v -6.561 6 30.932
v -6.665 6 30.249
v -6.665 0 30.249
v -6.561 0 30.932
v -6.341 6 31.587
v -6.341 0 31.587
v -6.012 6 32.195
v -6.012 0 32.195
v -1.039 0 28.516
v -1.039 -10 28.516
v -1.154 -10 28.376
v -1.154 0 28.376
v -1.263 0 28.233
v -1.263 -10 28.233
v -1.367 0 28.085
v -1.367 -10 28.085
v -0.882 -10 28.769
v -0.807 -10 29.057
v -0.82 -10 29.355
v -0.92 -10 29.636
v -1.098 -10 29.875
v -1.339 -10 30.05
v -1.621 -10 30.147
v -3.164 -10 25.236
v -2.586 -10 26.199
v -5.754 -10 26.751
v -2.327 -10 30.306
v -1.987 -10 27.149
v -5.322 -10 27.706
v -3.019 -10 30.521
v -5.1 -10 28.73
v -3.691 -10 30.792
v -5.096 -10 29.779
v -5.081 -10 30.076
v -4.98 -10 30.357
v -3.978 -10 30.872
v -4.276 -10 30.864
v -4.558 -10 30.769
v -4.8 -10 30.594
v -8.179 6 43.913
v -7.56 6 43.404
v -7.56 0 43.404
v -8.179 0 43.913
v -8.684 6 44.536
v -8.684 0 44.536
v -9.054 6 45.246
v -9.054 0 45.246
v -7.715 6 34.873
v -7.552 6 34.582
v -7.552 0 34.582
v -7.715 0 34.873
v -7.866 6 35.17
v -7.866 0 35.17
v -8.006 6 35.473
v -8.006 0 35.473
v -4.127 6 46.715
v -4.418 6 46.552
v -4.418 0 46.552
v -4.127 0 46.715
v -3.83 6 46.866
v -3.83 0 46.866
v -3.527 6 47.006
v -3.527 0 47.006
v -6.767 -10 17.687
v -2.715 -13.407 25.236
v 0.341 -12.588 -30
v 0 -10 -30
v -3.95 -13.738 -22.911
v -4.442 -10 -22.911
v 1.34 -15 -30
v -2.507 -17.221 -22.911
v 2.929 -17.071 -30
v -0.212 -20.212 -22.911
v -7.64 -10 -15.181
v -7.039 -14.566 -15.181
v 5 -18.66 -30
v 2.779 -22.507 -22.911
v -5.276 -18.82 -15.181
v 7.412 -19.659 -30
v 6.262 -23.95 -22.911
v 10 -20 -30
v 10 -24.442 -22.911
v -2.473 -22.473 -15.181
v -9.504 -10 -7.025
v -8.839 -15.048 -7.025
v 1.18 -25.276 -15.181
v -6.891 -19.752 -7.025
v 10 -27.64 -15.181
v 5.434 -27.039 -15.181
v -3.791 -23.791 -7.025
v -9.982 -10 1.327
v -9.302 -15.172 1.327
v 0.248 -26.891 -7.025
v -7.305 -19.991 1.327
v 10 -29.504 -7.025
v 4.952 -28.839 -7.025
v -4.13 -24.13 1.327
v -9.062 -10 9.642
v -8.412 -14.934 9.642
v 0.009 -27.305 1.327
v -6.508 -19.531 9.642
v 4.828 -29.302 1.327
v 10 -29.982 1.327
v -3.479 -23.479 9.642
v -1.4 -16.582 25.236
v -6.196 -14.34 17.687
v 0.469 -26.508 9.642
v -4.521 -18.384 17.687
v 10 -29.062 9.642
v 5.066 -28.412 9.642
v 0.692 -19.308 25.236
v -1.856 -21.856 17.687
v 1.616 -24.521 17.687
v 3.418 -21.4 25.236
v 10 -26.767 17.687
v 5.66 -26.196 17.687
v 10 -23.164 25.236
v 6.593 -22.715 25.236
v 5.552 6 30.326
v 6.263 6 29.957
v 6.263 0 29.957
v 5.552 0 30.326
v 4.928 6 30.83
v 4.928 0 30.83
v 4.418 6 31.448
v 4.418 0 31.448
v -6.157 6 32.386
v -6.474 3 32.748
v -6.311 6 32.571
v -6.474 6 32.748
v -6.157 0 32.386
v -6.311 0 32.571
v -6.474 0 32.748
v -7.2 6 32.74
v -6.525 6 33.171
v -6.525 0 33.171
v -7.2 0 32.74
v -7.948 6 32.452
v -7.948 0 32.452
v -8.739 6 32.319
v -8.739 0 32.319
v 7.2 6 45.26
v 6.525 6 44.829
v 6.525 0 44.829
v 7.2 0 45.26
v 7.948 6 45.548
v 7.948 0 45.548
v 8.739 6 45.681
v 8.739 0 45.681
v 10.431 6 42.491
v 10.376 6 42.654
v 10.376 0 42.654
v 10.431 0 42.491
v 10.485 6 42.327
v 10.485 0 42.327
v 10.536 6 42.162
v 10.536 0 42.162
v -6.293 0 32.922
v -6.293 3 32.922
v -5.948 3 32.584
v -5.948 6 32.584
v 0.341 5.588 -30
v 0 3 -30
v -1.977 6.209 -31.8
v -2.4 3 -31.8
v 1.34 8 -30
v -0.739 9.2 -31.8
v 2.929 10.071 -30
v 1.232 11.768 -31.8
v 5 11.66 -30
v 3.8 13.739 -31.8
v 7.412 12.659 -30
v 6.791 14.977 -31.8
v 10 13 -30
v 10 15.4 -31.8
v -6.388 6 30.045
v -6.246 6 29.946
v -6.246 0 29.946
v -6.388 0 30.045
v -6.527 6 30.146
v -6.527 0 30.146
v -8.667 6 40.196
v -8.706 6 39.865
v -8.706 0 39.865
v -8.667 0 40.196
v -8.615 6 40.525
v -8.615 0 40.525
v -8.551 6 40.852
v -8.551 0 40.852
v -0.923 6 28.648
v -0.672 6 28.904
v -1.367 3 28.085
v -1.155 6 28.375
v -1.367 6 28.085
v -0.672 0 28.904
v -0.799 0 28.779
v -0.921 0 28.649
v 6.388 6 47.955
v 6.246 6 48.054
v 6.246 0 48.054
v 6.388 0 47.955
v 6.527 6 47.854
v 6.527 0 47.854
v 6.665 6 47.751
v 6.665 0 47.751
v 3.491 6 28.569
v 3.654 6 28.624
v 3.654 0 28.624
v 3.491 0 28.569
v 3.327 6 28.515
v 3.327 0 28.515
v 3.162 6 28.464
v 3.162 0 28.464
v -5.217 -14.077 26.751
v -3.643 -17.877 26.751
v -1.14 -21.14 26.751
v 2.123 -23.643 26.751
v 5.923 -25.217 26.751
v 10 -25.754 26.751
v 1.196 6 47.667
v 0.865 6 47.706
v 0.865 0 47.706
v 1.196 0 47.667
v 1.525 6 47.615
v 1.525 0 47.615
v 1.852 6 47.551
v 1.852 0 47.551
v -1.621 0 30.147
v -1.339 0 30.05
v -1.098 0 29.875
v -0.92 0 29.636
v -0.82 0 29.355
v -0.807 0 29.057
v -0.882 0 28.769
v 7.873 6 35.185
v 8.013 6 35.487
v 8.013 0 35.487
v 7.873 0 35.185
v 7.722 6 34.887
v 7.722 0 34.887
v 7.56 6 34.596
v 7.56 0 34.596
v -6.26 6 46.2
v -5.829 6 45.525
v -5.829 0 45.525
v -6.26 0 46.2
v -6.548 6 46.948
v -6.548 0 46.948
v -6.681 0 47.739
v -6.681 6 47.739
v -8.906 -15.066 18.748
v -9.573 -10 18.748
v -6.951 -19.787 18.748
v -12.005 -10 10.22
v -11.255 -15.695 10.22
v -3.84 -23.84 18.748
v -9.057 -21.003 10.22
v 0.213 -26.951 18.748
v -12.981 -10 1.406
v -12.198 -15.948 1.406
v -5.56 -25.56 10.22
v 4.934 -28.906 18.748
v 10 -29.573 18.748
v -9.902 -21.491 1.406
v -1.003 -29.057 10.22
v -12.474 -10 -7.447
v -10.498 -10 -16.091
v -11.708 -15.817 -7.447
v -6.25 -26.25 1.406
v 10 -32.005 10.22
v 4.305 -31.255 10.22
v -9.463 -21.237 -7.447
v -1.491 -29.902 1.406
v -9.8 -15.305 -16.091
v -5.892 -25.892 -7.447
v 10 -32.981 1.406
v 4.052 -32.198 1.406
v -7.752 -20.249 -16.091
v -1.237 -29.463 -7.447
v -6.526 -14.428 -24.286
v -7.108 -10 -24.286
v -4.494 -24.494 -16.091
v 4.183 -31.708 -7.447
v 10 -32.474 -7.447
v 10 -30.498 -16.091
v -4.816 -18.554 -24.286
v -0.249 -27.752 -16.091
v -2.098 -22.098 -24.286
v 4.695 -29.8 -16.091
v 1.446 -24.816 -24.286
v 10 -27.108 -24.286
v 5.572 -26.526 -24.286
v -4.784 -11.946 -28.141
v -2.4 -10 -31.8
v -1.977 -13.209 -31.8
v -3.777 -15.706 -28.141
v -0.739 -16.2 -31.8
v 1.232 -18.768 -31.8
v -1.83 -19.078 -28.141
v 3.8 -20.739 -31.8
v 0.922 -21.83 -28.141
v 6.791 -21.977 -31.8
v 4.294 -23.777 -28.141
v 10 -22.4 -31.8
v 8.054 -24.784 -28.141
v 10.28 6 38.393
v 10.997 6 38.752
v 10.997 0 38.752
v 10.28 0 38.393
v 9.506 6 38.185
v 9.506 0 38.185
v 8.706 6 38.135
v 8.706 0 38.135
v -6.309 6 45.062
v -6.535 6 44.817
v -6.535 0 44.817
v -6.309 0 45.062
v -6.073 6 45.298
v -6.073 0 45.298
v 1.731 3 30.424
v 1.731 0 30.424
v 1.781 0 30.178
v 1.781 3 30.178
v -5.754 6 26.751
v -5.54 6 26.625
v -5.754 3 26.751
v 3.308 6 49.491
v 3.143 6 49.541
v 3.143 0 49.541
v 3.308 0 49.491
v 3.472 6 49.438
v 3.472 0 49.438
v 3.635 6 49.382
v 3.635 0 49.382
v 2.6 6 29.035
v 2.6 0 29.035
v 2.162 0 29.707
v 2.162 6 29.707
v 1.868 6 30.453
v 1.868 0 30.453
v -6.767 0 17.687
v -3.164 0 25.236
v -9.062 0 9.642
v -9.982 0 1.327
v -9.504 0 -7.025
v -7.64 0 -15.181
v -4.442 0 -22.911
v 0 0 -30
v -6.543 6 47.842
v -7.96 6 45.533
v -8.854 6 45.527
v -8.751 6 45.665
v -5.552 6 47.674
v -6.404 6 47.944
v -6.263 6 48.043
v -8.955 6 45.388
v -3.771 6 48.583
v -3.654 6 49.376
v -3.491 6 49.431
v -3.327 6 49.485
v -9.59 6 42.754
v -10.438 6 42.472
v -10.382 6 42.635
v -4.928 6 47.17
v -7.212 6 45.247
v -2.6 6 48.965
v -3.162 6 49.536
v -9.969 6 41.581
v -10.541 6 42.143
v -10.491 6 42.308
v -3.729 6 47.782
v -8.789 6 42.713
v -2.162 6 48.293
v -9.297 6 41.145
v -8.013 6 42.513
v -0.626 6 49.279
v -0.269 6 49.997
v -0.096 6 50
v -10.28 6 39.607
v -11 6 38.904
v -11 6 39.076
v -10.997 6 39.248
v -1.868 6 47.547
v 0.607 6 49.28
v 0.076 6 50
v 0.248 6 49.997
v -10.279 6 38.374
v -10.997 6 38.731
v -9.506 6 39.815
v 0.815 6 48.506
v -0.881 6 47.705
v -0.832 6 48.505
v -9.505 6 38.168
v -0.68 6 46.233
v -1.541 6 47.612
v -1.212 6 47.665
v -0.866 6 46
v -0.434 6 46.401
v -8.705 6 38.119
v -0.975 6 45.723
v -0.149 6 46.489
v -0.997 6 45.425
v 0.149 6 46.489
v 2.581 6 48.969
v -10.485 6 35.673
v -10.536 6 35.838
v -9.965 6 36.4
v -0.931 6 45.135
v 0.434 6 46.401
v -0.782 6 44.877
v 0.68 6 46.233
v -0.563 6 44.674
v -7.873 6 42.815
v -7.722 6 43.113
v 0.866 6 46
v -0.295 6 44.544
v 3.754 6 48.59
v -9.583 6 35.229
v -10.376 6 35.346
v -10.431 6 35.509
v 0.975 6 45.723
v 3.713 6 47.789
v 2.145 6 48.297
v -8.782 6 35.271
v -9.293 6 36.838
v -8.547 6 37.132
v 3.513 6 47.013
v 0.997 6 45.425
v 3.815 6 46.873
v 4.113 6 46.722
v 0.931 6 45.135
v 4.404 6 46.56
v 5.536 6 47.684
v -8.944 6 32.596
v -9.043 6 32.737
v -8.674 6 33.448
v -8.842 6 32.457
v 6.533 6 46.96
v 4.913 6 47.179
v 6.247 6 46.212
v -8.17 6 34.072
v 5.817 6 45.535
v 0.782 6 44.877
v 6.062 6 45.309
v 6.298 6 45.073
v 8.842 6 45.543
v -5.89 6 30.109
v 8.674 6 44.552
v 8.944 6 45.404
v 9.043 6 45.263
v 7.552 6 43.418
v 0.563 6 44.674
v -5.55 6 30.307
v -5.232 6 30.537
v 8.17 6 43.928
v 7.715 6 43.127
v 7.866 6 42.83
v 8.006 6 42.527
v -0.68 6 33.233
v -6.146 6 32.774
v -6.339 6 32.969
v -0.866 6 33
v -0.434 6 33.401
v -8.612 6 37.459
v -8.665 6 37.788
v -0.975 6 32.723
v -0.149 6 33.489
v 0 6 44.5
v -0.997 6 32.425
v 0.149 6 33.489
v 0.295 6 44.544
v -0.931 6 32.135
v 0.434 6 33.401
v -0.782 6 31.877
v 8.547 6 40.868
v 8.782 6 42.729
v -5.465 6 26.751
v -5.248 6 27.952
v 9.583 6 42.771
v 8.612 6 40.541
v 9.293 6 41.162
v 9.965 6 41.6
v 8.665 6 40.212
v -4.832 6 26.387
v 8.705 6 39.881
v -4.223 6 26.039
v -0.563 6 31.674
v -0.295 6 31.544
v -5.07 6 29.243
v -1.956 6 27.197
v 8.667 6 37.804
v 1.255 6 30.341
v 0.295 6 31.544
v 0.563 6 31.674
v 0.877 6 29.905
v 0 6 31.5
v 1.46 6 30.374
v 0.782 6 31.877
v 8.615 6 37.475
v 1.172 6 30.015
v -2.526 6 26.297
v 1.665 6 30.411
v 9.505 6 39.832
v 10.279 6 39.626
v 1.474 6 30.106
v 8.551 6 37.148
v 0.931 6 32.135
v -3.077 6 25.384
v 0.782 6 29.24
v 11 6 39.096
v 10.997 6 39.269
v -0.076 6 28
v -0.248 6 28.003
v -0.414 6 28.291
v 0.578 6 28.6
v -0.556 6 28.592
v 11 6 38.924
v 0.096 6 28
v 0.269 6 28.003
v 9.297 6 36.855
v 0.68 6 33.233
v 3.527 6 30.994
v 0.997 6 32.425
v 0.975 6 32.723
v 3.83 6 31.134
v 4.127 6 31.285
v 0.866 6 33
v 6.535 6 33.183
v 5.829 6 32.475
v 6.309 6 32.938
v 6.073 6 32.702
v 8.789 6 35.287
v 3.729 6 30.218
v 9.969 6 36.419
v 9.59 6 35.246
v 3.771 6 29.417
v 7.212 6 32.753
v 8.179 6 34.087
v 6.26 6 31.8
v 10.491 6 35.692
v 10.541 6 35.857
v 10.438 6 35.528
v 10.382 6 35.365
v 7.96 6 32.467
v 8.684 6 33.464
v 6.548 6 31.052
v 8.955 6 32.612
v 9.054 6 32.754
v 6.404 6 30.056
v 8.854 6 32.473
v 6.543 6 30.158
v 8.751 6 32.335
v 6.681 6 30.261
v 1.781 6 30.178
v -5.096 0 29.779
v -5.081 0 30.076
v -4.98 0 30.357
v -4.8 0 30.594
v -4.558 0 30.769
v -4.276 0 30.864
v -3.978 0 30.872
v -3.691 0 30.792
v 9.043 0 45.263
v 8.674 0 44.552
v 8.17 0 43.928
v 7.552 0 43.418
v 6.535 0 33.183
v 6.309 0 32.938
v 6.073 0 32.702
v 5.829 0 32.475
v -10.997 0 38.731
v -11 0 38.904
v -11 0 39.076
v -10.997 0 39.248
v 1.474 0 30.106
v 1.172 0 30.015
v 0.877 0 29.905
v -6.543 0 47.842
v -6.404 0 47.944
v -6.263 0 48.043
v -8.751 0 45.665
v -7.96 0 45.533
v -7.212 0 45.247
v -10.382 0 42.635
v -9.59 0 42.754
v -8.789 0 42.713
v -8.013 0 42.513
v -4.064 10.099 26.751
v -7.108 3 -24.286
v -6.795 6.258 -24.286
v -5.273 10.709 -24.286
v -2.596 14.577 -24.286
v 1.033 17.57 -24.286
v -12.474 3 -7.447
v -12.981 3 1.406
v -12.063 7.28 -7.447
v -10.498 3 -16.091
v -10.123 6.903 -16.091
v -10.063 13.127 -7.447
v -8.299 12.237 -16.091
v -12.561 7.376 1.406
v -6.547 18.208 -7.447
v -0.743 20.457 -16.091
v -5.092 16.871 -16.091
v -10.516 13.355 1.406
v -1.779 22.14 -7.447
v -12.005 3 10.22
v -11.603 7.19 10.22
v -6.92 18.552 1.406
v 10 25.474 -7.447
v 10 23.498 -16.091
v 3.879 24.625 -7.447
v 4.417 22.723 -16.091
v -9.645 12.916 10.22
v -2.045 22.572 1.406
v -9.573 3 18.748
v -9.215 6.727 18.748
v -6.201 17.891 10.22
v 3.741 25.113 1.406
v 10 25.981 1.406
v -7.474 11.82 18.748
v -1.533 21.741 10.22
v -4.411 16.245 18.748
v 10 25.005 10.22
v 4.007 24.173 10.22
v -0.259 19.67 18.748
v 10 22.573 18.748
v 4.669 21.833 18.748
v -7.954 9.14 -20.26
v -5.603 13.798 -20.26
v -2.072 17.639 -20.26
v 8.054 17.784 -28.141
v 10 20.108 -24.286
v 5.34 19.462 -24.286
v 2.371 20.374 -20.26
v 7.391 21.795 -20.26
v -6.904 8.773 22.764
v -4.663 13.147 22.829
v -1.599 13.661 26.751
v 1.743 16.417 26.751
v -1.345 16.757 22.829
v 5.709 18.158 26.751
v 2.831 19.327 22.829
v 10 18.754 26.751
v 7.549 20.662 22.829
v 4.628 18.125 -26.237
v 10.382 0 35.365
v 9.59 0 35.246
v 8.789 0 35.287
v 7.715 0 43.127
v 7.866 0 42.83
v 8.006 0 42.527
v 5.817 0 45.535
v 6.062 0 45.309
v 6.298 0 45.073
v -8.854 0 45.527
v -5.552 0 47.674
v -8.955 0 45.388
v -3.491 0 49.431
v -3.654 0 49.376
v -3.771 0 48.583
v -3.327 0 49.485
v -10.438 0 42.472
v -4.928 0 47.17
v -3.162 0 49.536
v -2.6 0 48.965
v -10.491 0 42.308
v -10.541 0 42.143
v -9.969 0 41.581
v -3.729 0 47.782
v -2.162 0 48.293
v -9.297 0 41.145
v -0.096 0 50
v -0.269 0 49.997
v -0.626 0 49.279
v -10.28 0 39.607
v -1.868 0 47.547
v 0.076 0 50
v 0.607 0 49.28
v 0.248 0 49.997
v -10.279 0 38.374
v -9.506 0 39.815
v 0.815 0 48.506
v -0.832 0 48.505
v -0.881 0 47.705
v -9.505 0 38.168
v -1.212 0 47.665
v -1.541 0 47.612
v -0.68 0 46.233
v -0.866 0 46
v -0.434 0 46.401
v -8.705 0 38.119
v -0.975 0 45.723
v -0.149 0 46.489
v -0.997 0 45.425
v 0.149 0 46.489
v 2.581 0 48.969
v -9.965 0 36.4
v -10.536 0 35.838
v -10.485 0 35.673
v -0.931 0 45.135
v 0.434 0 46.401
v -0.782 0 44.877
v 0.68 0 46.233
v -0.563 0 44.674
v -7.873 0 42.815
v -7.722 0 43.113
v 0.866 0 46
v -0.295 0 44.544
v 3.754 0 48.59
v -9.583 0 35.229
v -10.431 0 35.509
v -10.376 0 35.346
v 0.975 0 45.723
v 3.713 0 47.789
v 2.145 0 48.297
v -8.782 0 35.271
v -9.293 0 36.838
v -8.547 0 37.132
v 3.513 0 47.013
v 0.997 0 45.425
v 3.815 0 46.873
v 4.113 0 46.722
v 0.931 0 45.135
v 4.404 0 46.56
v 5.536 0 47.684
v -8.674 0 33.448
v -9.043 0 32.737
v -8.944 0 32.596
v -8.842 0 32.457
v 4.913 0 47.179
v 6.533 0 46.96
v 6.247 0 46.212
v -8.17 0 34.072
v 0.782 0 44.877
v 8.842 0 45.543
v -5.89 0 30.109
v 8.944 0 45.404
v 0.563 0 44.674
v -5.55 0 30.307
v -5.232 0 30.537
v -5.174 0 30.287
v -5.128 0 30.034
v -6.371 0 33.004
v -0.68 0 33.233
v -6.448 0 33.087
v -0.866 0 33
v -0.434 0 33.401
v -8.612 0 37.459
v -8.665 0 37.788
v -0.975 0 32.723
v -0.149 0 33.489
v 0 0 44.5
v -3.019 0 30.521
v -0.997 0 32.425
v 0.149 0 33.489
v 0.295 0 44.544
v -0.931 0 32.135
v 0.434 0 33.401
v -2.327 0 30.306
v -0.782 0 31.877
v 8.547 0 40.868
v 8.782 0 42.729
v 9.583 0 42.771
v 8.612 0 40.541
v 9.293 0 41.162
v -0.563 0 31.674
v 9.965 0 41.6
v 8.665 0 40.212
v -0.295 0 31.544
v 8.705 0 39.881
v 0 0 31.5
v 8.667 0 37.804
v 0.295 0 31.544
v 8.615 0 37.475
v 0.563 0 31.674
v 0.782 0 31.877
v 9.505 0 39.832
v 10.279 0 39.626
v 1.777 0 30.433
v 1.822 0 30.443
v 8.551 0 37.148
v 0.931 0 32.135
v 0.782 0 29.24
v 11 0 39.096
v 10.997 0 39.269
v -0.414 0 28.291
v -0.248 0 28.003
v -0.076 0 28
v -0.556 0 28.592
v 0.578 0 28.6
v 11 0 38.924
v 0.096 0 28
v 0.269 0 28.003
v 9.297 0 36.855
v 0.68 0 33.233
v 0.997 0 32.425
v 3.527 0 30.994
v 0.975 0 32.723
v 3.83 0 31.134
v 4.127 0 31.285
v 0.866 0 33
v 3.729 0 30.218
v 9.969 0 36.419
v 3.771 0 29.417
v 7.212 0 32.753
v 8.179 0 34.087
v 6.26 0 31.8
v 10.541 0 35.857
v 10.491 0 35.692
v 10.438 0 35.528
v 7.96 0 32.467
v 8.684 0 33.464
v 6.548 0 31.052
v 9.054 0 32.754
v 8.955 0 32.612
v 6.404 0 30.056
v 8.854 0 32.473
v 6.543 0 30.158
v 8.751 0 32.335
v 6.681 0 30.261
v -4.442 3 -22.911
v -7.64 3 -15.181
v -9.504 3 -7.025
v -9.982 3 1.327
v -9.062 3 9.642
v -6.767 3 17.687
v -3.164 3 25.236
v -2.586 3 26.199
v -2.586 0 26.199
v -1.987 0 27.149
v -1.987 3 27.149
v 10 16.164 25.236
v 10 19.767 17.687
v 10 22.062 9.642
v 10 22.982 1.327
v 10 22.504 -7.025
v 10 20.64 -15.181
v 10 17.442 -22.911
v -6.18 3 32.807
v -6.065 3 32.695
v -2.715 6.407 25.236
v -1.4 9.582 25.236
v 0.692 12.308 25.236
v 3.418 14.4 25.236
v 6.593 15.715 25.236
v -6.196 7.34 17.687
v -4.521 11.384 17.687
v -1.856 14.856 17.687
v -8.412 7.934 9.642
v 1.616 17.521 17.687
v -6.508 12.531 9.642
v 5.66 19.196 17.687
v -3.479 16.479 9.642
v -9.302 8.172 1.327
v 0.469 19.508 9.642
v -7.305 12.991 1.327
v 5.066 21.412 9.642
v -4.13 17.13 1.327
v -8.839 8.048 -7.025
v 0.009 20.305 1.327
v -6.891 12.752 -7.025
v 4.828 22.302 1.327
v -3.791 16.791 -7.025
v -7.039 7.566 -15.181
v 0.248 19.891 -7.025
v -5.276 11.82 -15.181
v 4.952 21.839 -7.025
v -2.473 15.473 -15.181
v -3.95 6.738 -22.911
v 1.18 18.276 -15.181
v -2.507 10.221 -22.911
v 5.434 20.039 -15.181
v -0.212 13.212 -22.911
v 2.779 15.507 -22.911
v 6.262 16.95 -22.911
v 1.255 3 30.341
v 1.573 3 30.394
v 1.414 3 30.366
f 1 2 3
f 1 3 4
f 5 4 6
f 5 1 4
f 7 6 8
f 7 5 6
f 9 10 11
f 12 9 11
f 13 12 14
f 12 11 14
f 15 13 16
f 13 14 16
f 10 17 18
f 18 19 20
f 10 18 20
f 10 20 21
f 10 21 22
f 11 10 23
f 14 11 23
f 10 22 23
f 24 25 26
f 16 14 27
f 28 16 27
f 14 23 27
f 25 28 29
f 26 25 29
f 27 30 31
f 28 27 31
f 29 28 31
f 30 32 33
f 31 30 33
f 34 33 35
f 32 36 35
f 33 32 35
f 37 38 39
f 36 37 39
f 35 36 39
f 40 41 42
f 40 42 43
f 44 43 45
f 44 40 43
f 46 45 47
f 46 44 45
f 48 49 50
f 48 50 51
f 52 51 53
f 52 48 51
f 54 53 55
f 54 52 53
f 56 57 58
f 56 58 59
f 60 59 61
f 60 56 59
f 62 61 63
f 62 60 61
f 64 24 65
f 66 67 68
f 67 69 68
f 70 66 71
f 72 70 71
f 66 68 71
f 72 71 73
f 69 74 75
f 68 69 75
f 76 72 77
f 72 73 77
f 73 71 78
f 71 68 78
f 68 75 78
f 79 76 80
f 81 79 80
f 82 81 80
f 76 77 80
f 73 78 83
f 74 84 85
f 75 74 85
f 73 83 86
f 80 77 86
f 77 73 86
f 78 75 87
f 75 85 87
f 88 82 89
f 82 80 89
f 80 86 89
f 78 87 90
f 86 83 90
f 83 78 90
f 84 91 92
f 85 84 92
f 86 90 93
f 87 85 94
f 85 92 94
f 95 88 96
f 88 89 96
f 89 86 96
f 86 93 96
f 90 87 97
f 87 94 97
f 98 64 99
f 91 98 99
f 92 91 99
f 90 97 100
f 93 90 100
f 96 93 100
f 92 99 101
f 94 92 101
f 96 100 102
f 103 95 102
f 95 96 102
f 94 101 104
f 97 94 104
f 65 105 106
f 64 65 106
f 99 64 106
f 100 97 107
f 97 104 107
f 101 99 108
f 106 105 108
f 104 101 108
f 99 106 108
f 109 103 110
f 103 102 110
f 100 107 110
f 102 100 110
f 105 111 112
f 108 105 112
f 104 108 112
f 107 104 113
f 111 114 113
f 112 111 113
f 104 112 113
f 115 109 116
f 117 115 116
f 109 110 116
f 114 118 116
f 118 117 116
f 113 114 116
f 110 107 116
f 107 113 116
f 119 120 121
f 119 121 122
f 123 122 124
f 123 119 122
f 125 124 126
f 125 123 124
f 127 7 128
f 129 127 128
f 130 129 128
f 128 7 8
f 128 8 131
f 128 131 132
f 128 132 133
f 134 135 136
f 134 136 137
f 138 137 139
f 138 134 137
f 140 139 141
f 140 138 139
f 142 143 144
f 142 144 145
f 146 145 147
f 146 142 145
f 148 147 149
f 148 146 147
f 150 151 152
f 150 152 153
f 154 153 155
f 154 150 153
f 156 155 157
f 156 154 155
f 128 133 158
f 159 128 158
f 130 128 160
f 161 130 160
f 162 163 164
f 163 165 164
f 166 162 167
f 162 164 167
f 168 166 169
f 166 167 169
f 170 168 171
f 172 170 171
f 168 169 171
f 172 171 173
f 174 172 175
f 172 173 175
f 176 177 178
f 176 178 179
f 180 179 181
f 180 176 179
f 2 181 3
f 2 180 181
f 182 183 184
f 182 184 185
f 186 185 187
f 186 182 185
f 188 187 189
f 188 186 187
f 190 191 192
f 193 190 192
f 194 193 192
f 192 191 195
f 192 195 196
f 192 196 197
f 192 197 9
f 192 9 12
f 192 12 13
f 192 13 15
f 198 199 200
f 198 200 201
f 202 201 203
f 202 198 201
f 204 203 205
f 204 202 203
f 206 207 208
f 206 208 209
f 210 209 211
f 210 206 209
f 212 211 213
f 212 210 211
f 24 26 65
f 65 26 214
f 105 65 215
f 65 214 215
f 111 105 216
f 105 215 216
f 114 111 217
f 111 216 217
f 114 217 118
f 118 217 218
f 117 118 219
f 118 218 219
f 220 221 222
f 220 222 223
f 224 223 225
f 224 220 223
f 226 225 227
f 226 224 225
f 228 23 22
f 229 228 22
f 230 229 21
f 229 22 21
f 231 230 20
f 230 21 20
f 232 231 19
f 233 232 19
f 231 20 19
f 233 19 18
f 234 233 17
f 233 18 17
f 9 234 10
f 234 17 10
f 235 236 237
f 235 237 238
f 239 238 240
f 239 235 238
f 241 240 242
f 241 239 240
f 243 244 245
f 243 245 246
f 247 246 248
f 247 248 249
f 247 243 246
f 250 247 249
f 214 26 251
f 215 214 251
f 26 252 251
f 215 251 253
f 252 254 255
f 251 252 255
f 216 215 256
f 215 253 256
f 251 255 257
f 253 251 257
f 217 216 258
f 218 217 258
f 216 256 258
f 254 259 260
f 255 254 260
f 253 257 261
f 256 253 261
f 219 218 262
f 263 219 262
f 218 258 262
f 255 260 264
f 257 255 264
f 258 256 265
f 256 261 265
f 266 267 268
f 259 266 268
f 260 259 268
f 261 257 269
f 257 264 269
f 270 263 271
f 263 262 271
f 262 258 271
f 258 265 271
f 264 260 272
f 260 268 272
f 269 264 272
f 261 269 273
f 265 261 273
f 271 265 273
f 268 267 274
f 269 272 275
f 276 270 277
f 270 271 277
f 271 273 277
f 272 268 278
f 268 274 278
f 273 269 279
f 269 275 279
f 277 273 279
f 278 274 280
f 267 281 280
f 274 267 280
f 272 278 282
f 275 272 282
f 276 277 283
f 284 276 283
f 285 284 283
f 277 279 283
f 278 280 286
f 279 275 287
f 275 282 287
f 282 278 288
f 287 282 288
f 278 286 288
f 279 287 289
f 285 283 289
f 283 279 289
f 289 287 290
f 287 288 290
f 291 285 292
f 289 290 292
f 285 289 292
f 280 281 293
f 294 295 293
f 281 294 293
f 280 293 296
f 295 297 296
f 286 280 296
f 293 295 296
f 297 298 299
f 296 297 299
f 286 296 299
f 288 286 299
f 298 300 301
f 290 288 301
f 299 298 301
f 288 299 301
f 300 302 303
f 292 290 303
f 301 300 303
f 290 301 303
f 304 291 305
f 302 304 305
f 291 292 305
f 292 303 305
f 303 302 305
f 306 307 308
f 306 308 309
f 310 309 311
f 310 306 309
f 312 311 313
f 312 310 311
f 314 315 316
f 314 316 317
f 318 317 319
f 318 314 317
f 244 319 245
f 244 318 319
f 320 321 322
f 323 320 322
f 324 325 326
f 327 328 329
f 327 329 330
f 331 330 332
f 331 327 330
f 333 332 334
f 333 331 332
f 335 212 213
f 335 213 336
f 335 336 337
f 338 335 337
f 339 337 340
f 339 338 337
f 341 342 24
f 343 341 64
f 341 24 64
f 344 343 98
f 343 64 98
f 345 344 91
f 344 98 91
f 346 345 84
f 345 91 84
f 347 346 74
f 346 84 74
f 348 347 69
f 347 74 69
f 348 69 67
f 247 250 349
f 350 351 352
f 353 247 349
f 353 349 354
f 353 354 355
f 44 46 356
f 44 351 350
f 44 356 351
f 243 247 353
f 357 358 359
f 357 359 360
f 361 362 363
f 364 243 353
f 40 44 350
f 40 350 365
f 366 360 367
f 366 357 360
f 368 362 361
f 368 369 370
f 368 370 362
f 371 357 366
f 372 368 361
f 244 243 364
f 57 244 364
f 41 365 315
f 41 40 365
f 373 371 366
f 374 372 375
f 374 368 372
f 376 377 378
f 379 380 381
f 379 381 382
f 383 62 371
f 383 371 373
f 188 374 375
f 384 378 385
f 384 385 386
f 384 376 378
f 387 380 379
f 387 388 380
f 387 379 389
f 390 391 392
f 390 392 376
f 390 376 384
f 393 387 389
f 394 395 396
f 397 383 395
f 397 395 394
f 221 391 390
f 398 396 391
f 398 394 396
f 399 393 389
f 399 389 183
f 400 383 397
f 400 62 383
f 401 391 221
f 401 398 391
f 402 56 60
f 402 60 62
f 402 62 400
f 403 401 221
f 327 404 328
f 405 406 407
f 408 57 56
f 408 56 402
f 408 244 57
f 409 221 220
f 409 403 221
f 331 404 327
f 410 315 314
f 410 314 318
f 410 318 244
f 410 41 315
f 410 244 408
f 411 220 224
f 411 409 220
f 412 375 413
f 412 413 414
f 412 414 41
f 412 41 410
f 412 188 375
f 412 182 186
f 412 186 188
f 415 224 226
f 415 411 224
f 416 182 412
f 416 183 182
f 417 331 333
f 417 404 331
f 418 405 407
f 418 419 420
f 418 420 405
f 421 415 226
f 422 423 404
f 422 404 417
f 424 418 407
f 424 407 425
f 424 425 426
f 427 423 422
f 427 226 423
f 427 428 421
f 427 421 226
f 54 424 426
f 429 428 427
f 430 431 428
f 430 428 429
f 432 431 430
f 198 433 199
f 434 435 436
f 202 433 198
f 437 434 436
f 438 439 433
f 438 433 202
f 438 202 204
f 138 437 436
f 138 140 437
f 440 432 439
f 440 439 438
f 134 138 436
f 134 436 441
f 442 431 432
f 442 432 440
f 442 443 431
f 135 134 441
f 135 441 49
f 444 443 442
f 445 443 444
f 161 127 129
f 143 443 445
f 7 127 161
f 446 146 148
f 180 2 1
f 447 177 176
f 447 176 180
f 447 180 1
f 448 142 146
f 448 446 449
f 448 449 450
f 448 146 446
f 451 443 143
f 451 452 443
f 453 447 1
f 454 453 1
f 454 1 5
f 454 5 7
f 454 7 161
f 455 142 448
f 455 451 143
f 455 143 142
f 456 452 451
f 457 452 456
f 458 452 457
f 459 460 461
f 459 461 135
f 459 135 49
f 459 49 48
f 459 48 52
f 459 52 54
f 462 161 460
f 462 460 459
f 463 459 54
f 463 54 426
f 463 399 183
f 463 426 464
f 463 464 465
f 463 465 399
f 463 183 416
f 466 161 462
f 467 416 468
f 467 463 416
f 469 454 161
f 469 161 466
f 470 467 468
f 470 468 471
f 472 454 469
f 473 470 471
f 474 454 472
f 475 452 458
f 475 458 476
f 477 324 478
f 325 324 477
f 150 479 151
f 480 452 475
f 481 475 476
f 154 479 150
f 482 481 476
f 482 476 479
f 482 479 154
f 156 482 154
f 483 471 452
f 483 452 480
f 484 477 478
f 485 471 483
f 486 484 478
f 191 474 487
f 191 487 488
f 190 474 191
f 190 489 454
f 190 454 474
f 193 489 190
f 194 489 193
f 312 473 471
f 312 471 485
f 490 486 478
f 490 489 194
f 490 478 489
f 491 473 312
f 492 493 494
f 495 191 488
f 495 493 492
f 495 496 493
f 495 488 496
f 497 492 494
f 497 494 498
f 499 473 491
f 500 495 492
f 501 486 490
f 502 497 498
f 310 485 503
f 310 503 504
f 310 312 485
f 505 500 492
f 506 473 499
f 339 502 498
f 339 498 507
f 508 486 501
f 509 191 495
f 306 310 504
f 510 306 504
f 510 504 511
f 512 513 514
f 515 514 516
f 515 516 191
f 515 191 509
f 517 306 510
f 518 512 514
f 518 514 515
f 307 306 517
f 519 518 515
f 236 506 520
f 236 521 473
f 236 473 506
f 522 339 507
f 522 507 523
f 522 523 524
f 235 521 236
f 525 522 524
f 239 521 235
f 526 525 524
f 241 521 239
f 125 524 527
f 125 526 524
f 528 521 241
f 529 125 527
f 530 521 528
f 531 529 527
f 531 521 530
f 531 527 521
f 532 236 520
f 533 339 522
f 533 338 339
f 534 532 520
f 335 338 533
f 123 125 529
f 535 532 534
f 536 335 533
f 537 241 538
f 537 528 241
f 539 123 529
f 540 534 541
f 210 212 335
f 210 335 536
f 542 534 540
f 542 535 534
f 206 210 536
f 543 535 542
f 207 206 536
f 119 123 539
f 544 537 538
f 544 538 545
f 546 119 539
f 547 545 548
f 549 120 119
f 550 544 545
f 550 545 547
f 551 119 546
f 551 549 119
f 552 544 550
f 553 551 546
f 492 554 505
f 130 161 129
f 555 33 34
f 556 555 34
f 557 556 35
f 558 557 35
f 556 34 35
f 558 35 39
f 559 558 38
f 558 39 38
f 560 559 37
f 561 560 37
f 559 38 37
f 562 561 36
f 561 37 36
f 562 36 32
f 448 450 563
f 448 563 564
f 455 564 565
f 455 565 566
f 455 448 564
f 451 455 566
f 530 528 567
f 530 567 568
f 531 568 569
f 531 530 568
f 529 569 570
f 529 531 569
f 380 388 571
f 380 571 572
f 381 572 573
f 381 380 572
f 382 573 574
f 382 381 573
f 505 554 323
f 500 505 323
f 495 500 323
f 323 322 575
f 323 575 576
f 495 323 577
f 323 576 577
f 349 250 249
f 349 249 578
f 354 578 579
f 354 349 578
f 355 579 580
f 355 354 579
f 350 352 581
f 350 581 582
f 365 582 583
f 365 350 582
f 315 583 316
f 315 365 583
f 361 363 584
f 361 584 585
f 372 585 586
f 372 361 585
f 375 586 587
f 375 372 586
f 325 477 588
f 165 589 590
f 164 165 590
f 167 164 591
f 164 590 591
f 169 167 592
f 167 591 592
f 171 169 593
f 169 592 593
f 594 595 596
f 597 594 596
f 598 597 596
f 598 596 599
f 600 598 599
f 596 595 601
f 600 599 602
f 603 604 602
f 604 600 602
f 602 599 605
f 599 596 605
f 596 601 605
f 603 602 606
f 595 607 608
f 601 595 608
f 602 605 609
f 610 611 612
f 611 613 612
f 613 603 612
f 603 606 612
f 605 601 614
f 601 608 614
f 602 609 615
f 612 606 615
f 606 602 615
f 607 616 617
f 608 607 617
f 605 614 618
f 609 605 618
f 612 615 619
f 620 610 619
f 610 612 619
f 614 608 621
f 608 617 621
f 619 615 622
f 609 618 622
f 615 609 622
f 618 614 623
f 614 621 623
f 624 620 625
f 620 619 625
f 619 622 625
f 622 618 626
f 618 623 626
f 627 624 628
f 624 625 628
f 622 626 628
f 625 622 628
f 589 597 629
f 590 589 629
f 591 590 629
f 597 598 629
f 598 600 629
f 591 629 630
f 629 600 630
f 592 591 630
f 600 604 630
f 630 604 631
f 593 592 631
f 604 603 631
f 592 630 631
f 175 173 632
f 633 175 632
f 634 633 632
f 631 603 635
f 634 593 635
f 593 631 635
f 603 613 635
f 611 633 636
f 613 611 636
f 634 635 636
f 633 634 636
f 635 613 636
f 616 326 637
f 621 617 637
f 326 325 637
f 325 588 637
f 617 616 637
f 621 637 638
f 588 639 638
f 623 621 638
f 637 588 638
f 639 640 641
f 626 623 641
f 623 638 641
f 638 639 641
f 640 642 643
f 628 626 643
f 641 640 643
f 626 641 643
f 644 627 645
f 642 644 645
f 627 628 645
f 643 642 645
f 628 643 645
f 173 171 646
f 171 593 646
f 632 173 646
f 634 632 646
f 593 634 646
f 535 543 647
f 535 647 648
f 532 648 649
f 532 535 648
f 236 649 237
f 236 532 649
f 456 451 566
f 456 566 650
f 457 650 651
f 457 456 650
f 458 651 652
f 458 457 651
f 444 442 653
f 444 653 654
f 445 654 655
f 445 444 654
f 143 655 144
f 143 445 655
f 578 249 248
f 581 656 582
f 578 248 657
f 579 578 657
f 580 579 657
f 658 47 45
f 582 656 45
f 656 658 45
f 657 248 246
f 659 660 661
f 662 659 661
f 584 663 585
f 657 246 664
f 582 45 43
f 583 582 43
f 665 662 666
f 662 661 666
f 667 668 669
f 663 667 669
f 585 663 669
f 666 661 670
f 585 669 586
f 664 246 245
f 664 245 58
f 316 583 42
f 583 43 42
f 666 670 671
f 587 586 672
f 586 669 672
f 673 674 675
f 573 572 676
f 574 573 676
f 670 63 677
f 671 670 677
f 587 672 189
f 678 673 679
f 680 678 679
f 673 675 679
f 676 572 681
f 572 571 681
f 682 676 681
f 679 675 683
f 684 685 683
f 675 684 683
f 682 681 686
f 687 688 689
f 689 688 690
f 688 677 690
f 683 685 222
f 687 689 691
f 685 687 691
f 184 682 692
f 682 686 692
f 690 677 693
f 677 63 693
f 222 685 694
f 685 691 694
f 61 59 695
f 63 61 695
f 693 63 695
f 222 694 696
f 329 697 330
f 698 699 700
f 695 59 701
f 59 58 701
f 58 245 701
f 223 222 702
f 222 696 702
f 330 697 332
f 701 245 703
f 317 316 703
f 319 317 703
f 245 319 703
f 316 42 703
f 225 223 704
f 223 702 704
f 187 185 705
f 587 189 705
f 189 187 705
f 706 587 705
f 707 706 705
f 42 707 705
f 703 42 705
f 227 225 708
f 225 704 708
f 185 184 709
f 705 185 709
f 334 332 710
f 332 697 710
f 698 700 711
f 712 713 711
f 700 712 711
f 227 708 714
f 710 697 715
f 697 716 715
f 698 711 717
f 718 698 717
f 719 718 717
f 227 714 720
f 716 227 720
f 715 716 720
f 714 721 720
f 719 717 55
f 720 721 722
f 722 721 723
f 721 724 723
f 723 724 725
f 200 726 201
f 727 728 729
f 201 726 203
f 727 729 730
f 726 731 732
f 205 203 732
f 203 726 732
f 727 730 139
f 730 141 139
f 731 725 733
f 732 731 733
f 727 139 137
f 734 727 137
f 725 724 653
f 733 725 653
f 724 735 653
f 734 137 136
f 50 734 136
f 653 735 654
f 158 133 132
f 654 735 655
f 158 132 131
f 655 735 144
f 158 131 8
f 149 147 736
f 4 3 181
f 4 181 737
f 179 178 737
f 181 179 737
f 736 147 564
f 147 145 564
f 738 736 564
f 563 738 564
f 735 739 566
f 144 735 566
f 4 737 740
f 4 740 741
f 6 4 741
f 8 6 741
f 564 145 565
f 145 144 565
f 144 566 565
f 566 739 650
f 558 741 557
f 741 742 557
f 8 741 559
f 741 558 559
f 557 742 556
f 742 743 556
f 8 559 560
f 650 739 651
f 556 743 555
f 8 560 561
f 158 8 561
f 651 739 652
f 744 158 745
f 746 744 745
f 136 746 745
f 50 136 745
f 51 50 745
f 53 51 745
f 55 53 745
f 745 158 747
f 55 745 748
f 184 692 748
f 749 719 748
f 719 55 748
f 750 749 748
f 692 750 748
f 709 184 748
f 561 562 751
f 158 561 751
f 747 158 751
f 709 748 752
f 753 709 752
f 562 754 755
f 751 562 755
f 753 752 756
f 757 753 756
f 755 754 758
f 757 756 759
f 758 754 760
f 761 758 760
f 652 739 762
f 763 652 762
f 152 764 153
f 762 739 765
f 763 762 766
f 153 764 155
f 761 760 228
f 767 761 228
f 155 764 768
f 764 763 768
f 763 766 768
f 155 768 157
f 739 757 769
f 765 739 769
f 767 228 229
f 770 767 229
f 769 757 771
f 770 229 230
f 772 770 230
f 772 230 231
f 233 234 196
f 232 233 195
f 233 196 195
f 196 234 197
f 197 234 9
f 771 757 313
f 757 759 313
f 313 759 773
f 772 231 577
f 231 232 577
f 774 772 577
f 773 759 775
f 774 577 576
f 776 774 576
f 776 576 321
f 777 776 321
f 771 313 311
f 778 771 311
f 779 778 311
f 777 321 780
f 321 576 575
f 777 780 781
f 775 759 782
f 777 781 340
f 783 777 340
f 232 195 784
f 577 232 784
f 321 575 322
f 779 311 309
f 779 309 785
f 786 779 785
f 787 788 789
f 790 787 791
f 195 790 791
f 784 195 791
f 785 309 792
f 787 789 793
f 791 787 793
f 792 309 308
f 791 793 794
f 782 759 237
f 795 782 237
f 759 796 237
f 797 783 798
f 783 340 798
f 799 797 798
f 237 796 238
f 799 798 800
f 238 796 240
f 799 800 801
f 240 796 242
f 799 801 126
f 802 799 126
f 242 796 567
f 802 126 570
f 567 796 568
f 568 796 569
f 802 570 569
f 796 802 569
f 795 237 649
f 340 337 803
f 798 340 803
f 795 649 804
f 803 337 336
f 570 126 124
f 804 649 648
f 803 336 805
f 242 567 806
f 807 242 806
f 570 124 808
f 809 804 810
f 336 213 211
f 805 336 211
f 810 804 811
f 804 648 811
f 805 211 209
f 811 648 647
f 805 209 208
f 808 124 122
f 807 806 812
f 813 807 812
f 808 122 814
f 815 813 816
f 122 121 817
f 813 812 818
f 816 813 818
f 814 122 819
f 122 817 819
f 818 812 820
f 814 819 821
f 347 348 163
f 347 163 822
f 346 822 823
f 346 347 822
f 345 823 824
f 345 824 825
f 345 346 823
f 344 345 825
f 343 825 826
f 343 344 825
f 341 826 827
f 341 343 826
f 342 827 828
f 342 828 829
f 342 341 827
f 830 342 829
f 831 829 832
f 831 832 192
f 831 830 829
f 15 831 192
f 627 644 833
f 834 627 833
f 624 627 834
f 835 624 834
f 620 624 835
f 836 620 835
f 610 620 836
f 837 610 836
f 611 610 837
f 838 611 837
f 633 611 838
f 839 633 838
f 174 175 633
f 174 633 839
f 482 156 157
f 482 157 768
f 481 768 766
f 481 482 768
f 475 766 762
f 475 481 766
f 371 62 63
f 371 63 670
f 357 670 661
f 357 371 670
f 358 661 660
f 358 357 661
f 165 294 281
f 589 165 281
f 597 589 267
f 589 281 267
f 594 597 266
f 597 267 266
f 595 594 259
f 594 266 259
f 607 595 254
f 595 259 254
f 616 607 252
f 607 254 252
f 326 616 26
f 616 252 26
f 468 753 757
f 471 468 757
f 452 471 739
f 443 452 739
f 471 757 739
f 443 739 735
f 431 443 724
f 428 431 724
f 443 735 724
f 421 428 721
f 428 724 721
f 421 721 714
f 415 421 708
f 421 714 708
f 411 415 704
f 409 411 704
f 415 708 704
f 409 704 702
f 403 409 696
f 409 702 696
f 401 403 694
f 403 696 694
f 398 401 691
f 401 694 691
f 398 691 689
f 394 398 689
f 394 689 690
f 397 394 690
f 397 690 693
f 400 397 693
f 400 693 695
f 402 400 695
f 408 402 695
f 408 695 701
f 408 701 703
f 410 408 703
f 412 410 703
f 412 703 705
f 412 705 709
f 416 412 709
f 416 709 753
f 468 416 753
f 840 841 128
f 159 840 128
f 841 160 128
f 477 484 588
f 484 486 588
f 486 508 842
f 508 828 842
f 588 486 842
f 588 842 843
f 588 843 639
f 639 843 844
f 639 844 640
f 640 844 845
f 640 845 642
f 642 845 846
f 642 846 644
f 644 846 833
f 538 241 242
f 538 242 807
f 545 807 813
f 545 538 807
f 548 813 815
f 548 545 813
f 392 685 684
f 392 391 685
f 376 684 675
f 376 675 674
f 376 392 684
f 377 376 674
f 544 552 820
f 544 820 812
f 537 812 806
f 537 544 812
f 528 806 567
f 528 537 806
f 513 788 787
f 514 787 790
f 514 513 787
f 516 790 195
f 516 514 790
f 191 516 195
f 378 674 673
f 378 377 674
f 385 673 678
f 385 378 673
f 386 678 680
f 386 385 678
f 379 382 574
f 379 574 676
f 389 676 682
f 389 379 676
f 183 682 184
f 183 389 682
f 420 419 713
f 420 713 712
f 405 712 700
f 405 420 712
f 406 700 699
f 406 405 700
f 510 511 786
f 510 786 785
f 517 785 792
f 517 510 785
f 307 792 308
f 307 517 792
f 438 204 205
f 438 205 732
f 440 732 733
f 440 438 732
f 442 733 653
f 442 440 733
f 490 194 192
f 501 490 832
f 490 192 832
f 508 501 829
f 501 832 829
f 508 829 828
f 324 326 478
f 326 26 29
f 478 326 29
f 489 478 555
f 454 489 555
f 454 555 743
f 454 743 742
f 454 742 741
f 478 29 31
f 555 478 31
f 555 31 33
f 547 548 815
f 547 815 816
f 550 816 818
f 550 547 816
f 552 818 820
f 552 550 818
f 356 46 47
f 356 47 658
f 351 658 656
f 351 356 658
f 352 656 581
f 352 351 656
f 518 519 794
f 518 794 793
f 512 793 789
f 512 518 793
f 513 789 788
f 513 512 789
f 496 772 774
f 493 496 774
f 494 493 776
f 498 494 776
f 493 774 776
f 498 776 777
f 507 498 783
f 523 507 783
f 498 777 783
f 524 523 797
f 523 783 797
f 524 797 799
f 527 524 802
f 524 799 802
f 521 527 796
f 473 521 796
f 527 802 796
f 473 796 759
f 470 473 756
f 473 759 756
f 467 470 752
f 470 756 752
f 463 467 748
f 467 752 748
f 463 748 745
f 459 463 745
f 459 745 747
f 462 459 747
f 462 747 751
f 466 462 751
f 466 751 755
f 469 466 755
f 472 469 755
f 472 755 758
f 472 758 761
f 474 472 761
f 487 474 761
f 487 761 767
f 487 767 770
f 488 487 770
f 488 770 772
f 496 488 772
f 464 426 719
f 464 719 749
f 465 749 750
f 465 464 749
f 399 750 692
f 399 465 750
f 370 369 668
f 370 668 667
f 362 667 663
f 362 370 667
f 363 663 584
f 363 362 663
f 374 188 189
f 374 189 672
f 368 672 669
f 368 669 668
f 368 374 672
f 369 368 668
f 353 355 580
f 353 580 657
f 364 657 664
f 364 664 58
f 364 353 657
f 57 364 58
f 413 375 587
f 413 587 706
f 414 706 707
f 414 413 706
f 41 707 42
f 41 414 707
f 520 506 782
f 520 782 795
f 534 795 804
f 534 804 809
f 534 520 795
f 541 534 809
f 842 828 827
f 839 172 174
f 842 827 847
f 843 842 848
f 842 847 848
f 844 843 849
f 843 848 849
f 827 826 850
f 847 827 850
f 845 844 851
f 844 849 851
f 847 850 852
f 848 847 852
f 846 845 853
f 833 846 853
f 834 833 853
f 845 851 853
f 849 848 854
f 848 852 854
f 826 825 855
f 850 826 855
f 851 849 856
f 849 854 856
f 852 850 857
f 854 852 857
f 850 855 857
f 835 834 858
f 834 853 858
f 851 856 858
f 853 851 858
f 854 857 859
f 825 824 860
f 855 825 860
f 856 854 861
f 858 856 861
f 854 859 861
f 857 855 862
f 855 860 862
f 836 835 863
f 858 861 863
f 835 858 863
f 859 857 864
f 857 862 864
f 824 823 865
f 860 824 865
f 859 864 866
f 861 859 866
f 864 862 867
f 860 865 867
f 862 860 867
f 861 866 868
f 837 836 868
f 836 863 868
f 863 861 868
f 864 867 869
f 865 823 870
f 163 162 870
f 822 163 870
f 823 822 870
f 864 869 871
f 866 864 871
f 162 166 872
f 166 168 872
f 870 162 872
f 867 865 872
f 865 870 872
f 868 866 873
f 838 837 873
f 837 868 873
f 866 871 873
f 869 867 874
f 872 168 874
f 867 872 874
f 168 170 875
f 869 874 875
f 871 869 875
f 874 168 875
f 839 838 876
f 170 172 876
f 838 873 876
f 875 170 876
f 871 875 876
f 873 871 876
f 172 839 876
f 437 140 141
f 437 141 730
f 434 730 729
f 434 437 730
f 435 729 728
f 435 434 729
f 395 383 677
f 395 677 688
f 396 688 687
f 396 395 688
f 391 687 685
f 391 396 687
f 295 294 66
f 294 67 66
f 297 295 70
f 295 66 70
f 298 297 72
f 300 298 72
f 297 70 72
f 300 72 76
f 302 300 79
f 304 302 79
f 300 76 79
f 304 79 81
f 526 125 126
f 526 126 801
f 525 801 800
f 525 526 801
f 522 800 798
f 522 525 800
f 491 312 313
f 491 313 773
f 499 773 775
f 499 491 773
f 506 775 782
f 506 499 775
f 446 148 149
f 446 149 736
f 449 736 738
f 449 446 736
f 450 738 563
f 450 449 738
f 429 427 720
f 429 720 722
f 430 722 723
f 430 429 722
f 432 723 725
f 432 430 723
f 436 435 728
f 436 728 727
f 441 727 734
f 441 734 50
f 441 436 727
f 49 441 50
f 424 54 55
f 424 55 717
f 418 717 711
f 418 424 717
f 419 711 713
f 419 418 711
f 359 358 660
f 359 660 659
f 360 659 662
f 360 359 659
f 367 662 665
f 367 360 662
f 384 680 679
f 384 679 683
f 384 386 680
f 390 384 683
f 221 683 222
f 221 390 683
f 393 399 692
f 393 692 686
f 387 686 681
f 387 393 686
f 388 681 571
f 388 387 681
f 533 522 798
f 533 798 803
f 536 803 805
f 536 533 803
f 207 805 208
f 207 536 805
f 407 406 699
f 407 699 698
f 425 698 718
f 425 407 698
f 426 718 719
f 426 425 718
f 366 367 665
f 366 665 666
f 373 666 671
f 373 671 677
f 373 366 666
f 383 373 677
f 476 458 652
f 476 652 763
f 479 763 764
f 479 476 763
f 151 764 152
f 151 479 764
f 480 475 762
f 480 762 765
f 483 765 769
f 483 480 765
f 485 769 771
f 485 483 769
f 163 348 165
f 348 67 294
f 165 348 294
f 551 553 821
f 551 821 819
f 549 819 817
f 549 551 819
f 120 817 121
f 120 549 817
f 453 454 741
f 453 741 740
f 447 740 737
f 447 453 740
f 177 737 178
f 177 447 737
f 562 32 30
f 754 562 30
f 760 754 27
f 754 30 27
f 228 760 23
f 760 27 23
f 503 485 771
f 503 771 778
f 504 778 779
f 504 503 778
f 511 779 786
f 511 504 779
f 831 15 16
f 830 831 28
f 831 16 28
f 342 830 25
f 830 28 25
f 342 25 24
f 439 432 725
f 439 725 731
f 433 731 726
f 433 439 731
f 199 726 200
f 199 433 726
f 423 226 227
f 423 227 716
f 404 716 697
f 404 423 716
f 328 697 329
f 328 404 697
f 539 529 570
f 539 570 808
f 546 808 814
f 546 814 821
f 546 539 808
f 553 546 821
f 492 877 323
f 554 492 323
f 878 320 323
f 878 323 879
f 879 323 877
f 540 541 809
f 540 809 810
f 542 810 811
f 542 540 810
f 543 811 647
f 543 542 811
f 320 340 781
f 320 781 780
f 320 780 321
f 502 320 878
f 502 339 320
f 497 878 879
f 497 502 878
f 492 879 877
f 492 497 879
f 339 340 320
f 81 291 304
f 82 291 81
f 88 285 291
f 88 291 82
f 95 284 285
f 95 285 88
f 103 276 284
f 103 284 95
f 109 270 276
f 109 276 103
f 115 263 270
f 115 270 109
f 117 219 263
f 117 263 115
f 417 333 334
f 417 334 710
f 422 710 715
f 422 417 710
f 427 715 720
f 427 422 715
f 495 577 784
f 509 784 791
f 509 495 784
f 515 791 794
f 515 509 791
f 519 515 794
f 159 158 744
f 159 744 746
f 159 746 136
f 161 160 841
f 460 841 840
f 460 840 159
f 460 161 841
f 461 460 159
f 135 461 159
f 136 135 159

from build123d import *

# Parameters (mm, degrees)
SKETCH_1_R          = 1.25
EXTRUDE_2_DEPTH     = 3
REVOLVE_6_ANGLE     = 90
EXTRUDE_START       = 10
EXTRUDE_3_DEPTH     = 10
REVOLVE_7_ANGLE     = 90
EXTRUDE_4_DEPTH     = 10
CUT_EXTRUDE_START   = -3
CUT_EXTRUDE_1_DEPTH = 3
EXTRUDE_6_DEPTH     = 3
EXTRUDE_7_DEPTH     = 3
SKETCH_9_R          = 1
CUT_EXTRUDE_2_DEPTH = 62.302528599


with BuildPart() as part:
    # 草图1 → 凸台-拉伸2 (new body)
    with BuildSketch(Plane(origin=(0, 0, 0), x_dir=(1, 0, 0), z_dir=(0, 1, 0))):
        with BuildLine():
            Line((-2.4, 31.8), (0, 30))
            ThreePointArc((0, 30), (-9.986161593, 1.176286204), (-1.366875999, -28.085255385))
            ThreePointArc((-1.366875999, -28.085255385), (0.001505949, -29.44044019), (1.780593172, -30.177897759))
            ThreePointArc((1.780593172, -30.177897759), (2.675299798, -47.593181657), (-6.473683781, -32.747686964))
            ThreePointArc((-6.473683781, -32.747686964), (-5.105814689, -29.870106713), (-5.753780394, -26.750543539))
            ThreePointArc((-5.753780394, -26.750543539), (-12.913266641, 3.030876667), (-2.4, 31.8))
        make_face()
        with Locations(Location((0, -39, 0), (0, 0, 270))):
            Circle(SKETCH_1_R, mode=Mode.SUBTRACT)
    extrude(amount=EXTRUDE_2_DEPTH)

    # 草图2 → 旋转6 (revolve)
    with BuildSketch(Plane(origin=(0, 3, 0), x_dir=(1, 0, 0), z_dir=(0, 1, 0))):
        with BuildLine():
            Line((-5.753780394, -26.750543539), (-3.163943768, -25.236361829))
            ThreePointArc((-3.163943768, -25.236361829), (-9.918176076, 2.85931761), (0, 30))
            Line((0, 30), (-2.4, 31.8))
            ThreePointArc((-2.4, 31.8), (-12.913266641, 3.030876667), (-5.753780394, -26.750543539))
        make_face()
    revolve(axis=Axis((10, 3, -9.741803388), (0, 0, -1)), revolution_arc=REVOLVE_6_ANGLE)

    # 草图3 → 凸台-拉伸3 (add)
    with BuildSketch(Plane.XZ.offset(EXTRUDE_START)):
        with BuildLine():
            Line((0, -30), (-2.4, -31.8))
            ThreePointArc((-2.4, -31.8), (-12.913266641, -3.030876667), (-5.753780394, 26.750543539))
            Line((-5.753780394, 26.750543539), (-3.163943768, 25.236361829))
            ThreePointArc((-3.163943768, 25.236361829), (-9.918176076, -2.85931761), (0, -30))
        make_face()
    extrude(amount=-EXTRUDE_3_DEPTH)

    # 草图4 → 旋转7 (revolve)
    with BuildSketch(Plane.XZ.offset(10)):
        with BuildLine():
            Line((-3.163943768, 25.236361829), (-5.753780394, 26.750543539))
            ThreePointArc((-5.753780394, 26.750543539), (-12.913266641, -3.030876667), (-2.4, -31.8))
            Line((-2.4, -31.8), (0, -30))
            ThreePointArc((0, -30), (-9.918176076, -2.85931761), (-3.163943768, 25.236361829))
        make_face()
    revolve(axis=Axis((10, -10, 0), (0, 0, 1)), revolution_arc=REVOLVE_7_ANGLE)

    # 草图5 → 凸台-拉伸4 (add)
    with BuildSketch(Plane.XZ.offset(EXTRUDE_START)):
        with BuildLine():
            Line((-3.163943768, 25.236361829), (-5.753780394, 26.750543539))
            ThreePointArc((-5.753780394, 26.750543539), (-5.18423252, 28.212309525), (-5.095685056, 29.778612154))
            ThreePointArc((-5.095685056, 29.778612154), (-4.685606345, 30.69066229), (-3.690708402, 30.791548776))
            ThreePointArc((-3.690708402, 30.791548776), (-2.675299798, 30.406818343), (-1.620948336, 30.147174096))
            ThreePointArc((-1.620948336, 30.147174096), (-0.859137451, 29.499374608), (-1.039242822, 28.515727285))
            ThreePointArc((-1.039242822, 28.515727285), (-1.208885496, 28.304925583), (-1.366875999, 28.085255385))
            ThreePointArc((-1.366875999, 28.085255385), (-2.289406726, 26.675945695), (-3.163943768, 25.236361829))
        make_face()
    extrude(amount=-EXTRUDE_4_DEPTH)

    # 草图7 → 切除-拉伸1 (cut)
    with BuildSketch(Plane(origin=(0, 3, 0), x_dir=(1, 0, 0), z_dir=(0, 1, 0)).offset(CUT_EXTRUDE_START)):
        with BuildLine():
            Line((-6.473683781, -32.747686964), (0, -39))
            Line((0, -39), (1.780593172, -30.177897759))
            ThreePointArc((1.780593172, -30.177897759), (2.675299798, -47.593181657), (-6.473683781, -32.747686964))
        make_face()
    extrude(amount=CUT_EXTRUDE_1_DEPTH, mode=Mode.SUBTRACT)

    # 草图8 → 凸台-拉伸6 (add)
    with BuildSketch(Plane(origin=(0, 3, 0), x_dir=(1, 0, 0), z_dir=(0, 1, 0))):
        with BuildLine():
            Line((-6.473683781, -32.747686964), (1.780593172, -30.177897759))
            ThreePointArc((1.780593172, -30.177897759), (0.001505949, -29.44044019), (-1.366875999, -28.085255385))
            ThreePointArc((-1.366875999, -28.085255385), (-2.289406726, -26.675945695), (-3.163943768, -25.236361829))
            Line((-3.163943768, -25.236361829), (-5.753780394, -26.750543539))
            ThreePointArc((-5.753780394, -26.750543539), (-5.105814689, -29.870106713), (-6.473683781, -32.747686964))
        make_face()
    extrude(amount=EXTRUDE_6_DEPTH)

    # 草图6 → 凸台-拉伸7 (add, symmetric)
    with BuildSketch(Plane(origin=(0, 3, 0), x_dir=(1, 0, 0), z_dir=(0, 1, 0))):
        with BuildLine():
            ThreePointArc((0.248482904, -49.997193108), (0.730347264, -48.898415235), (0.864685889, -47.706165592))
            ThreePointArc((0.864685889, -47.706165592), (1.360749528, -47.642532136), (1.852366606, -47.550657224))
            ThreePointArc((1.852366606, -47.550657224), (2.34655871, -48.643945951), (3.142741235, -49.541497879))
            ThreePointArc((3.142741235, -49.541497879), (3.38962735, -49.464722951), (3.634640845, -49.382166726))
            ThreePointArc((3.634640845, -49.382166726), (3.75338005, -48.188262593), (3.512718273, -47.012852884))
            ThreePointArc((3.512718273, -47.012852884), (3.96483901, -46.799041776), (4.404003727, -46.55974551))
            ThreePointArc((4.404003727, -46.55974551), (5.211853144, -47.44681112), (6.246426521, -48.054399799))
            ThreePointArc((6.246426521, -48.054399799), (6.457504412, -47.905090498), (6.665014817, -47.750861528))
            ThreePointArc((6.665014817, -47.750861528), (6.409005844, -46.578698791), (5.816901318, -45.535186307))
            ThreePointArc((5.816901318, -45.535186307), (6.180822425, -45.192126868), (6.524546278, -44.828833234))
            ThreePointArc((6.524546278, -44.828833234), (7.566975078, -45.422843564), (8.738668058, -45.680993981))
            ThreePointArc((8.738668058, -45.680993981), (8.89327595, -45.473765742), (9.042970701, -45.262961033))
            ThreePointArc((9.042970701, -45.262961033), (8.437273493, -44.227279147), (7.551685533, -43.41781016))
            ThreePointArc((7.551685533, -43.41781016), (7.791783877, -42.979083439), (8.00642078, -42.527354149))
            ThreePointArc((8.00642078, -42.527354149), (9.18138877, -42.770163329), (10.37550788, -42.653605923))
            ThreePointArc((10.37550788, -42.653605923), (10.458511675, -42.408743689), (10.535737606, -42.161998276))
            ThreePointArc((10.535737606, -42.161998276), (9.639642026, -41.364177), (8.547258152, -40.867987975))
            ThreePointArc((8.547258152, -40.867987975), (8.640031234, -40.376539599), (8.704571032, -39.880593064))
            ThreePointArc((8.704571032, -39.880593064), (9.897064159, -39.74843324), (10.9967207, -39.268577461))
            ThreePointArc((10.9967207, -39.268577461), (10.999995409, -39.010050055), (10.997193108, -38.751517096))
            ThreePointArc((10.997193108, -38.751517096), (9.898415235, -38.269652736), (8.706165592, -38.135314111))
            ThreePointArc((8.706165592, -38.135314111), (8.642532136, -37.639250472), (8.550657224, -37.147633394))
            ThreePointArc((8.550657224, -37.147633394), (9.643945951, -36.65344129), (10.541497879, -35.857258765))
            ThreePointArc((10.541497879, -35.857258765), (10.464722951, -35.61037265), (10.382166726, -35.365359155))
            ThreePointArc((10.382166726, -35.365359155), (9.188262593, -35.24661995), (8.012852884, -35.487281727))
            ThreePointArc((8.012852884, -35.487281727), (7.799041776, -35.03516099), (7.55974551, -34.595996273))
            ThreePointArc((7.55974551, -34.595996273), (8.44681112, -33.788146856), (9.054399799, -32.753573479))
            ThreePointArc((9.054399799, -32.753573479), (8.905090498, -32.542495588), (8.750861528, -32.334985183))
            ThreePointArc((8.750861528, -32.334985183), (7.578698791, -32.590994156), (6.535186307, -33.183098682))
            ThreePointArc((6.535186307, -33.183098682), (6.192126868, -32.819177575), (5.828833234, -32.475453722))
            ThreePointArc((5.828833234, -32.475453722), (6.422843564, -31.433024922), (6.680993981, -30.261331942))
            ThreePointArc((6.680993981, -30.261331942), (6.473765742, -30.10672405), (6.262961033, -29.957029299))
            ThreePointArc((6.262961033, -29.957029299), (5.227279147, -30.562726507), (4.41781016, -31.448314467))
            ThreePointArc((4.41781016, -31.448314467), (3.979083439, -31.208216123), (3.527354149, -30.99357922))
            ThreePointArc((3.527354149, -30.99357922), (3.770163329, -29.81861123), (3.653605923, -28.62449212))
            ThreePointArc((3.653605923, -28.62449212), (3.408743689, -28.541488325), (3.161998276, -28.464262394))
            ThreePointArc((3.161998276, -28.464262394), (2.364177, -29.360357974), (1.867987975, -30.452741848))
            ThreePointArc((1.867987975, -30.452741848), (1.376539599, -30.359968766), (0.880593064, -30.295428968))
            ThreePointArc((0.880593064, -30.295428968), (0.74843324, -29.102935841), (0.268577461, -28.0032793))
            ThreePointArc((0.268577461, -28.0032793), (0.010050055, -28.000004591), (-0.248482904, -28.002806892))
            ThreePointArc((-0.248482904, -28.002806892), (-0.730347264, -29.101584765), (-0.864685889, -30.293834408))
            ThreePointArc((-0.864685889, -30.293834408), (-1.360749528, -30.357467864), (-1.852366606, -30.449342776))
            ThreePointArc((-1.852366606, -30.449342776), (-2.34655871, -29.356054049), (-3.142741235, -28.458502121))
            ThreePointArc((-3.142741235, -28.458502121), (-3.38962735, -28.535277049), (-3.634640845, -28.617833274))
            ThreePointArc((-3.634640845, -28.617833274), (-3.75338005, -29.811737407), (-3.512718273, -30.987147116))
            ThreePointArc((-3.512718273, -30.987147116), (-3.96483901, -31.200958224), (-4.404003727, -31.44025449))
            ThreePointArc((-4.404003727, -31.44025449), (-5.211853144, -30.55318888), (-6.246426521, -29.945600201))
            ThreePointArc((-6.246426521, -29.945600201), (-6.457504412, -30.094909502), (-6.665014817, -30.249138472))
            ThreePointArc((-6.665014817, -30.249138472), (-6.409005844, -31.421301209), (-5.816901318, -32.464813693))
            ThreePointArc((-5.816901318, -32.464813693), (-6.180822425, -32.807873132), (-6.524546278, -33.171166766))
            ThreePointArc((-6.524546278, -33.171166766), (-7.566975078, -32.577156436), (-8.738668058, -32.319006019))
            ThreePointArc((-8.738668058, -32.319006019), (-8.89327595, -32.526234258), (-9.042970701, -32.737038967))
            ThreePointArc((-9.042970701, -32.737038967), (-8.437273493, -33.772720853), (-7.551685533, -34.58218984))
            ThreePointArc((-7.551685533, -34.58218984), (-7.791783877, -35.020916561), (-8.00642078, -35.472645851))
            ThreePointArc((-8.00642078, -35.472645851), (-9.18138877, -35.229836671), (-10.37550788, -35.346394077))
            ThreePointArc((-10.37550788, -35.346394077), (-10.458511675, -35.591256311), (-10.535737606, -35.838001724))
            ThreePointArc((-10.535737606, -35.838001724), (-9.639642026, -36.635823), (-8.547258152, -37.132012025))
            ThreePointArc((-8.547258152, -37.132012025), (-8.640031234, -37.623460401), (-8.704571032, -38.119406936))
            ThreePointArc((-8.704571032, -38.119406936), (-9.897064159, -38.25156676), (-10.9967207, -38.731422539))
            ThreePointArc((-10.9967207, -38.731422539), (-10.999995409, -38.989949945), (-10.997193108, -39.248482904))
            ThreePointArc((-10.997193108, -39.248482904), (-9.898415235, -39.730347264), (-8.706165592, -39.864685889))
            ThreePointArc((-8.706165592, -39.864685889), (-8.642532136, -40.360749528), (-8.550657224, -40.852366606))
            ThreePointArc((-8.550657224, -40.852366606), (-9.643945951, -41.34655871), (-10.541497879, -42.142741235))
            ThreePointArc((-10.541497879, -42.142741235), (-10.464722951, -42.38962735), (-10.382166726, -42.634640845))
            ThreePointArc((-10.382166726, -42.634640845), (-9.188262593, -42.75338005), (-8.012852884, -42.512718273))
            ThreePointArc((-8.012852884, -42.512718273), (-7.799041776, -42.96483901), (-7.55974551, -43.404003727))
            ThreePointArc((-7.55974551, -43.404003727), (-8.44681112, -44.211853144), (-9.054399799, -45.246426521))
            ThreePointArc((-9.054399799, -45.246426521), (-8.905090498, -45.457504412), (-8.750861528, -45.665014817))
            ThreePointArc((-8.750861528, -45.665014817), (-7.578698791, -45.409005844), (-6.535186307, -44.816901318))
            ThreePointArc((-6.535186307, -44.816901318), (-6.192126868, -45.180822425), (-5.828833234, -45.524546278))
            ThreePointArc((-5.828833234, -45.524546278), (-6.422843564, -46.566975078), (-6.680993981, -47.738668058))
            ThreePointArc((-6.680993981, -47.738668058), (-6.473765742, -47.89327595), (-6.262961033, -48.042970701))
            ThreePointArc((-6.262961033, -48.042970701), (-5.227279147, -47.437273493), (-4.41781016, -46.551685533))
            ThreePointArc((-4.41781016, -46.551685533), (-3.979083439, -46.791783877), (-3.527354149, -47.00642078))
            ThreePointArc((-3.527354149, -47.00642078), (-3.770163329, -48.18138877), (-3.653605923, -49.37550788))
            ThreePointArc((-3.653605923, -49.37550788), (-3.408743689, -49.458511675), (-3.161998276, -49.535737606))
            ThreePointArc((-3.161998276, -49.535737606), (-2.364177, -48.639642026), (-1.867987975, -47.547258152))
            ThreePointArc((-1.867987975, -47.547258152), (-1.376539599, -47.640031234), (-0.880593064, -47.704571032))
            ThreePointArc((-0.880593064, -47.704571032), (-0.74843324, -48.897064159), (-0.268577461, -49.9967207))
            ThreePointArc((-0.268577461, -49.9967207), (-0.010050055, -49.999995409), (0.248482904, -49.997193108))
        make_face()
    extrude(amount=EXTRUDE_7_DEPTH, both=True)

    # 草图9 → 切除-拉伸2 (cut, through all)
    with BuildSketch(Plane.XZ):
        with Locations(Location((0, 45.5, 0), (0, 0, 270))):
            Circle(SKETCH_9_R)
        with Locations(Location((0, 32.5, 0), (0, 0, 270))):
            Circle(SKETCH_9_R)
    extrude(amount=-CUT_EXTRUDE_2_DEPTH, mode=Mode.SUBTRACT)


solid = part.part
